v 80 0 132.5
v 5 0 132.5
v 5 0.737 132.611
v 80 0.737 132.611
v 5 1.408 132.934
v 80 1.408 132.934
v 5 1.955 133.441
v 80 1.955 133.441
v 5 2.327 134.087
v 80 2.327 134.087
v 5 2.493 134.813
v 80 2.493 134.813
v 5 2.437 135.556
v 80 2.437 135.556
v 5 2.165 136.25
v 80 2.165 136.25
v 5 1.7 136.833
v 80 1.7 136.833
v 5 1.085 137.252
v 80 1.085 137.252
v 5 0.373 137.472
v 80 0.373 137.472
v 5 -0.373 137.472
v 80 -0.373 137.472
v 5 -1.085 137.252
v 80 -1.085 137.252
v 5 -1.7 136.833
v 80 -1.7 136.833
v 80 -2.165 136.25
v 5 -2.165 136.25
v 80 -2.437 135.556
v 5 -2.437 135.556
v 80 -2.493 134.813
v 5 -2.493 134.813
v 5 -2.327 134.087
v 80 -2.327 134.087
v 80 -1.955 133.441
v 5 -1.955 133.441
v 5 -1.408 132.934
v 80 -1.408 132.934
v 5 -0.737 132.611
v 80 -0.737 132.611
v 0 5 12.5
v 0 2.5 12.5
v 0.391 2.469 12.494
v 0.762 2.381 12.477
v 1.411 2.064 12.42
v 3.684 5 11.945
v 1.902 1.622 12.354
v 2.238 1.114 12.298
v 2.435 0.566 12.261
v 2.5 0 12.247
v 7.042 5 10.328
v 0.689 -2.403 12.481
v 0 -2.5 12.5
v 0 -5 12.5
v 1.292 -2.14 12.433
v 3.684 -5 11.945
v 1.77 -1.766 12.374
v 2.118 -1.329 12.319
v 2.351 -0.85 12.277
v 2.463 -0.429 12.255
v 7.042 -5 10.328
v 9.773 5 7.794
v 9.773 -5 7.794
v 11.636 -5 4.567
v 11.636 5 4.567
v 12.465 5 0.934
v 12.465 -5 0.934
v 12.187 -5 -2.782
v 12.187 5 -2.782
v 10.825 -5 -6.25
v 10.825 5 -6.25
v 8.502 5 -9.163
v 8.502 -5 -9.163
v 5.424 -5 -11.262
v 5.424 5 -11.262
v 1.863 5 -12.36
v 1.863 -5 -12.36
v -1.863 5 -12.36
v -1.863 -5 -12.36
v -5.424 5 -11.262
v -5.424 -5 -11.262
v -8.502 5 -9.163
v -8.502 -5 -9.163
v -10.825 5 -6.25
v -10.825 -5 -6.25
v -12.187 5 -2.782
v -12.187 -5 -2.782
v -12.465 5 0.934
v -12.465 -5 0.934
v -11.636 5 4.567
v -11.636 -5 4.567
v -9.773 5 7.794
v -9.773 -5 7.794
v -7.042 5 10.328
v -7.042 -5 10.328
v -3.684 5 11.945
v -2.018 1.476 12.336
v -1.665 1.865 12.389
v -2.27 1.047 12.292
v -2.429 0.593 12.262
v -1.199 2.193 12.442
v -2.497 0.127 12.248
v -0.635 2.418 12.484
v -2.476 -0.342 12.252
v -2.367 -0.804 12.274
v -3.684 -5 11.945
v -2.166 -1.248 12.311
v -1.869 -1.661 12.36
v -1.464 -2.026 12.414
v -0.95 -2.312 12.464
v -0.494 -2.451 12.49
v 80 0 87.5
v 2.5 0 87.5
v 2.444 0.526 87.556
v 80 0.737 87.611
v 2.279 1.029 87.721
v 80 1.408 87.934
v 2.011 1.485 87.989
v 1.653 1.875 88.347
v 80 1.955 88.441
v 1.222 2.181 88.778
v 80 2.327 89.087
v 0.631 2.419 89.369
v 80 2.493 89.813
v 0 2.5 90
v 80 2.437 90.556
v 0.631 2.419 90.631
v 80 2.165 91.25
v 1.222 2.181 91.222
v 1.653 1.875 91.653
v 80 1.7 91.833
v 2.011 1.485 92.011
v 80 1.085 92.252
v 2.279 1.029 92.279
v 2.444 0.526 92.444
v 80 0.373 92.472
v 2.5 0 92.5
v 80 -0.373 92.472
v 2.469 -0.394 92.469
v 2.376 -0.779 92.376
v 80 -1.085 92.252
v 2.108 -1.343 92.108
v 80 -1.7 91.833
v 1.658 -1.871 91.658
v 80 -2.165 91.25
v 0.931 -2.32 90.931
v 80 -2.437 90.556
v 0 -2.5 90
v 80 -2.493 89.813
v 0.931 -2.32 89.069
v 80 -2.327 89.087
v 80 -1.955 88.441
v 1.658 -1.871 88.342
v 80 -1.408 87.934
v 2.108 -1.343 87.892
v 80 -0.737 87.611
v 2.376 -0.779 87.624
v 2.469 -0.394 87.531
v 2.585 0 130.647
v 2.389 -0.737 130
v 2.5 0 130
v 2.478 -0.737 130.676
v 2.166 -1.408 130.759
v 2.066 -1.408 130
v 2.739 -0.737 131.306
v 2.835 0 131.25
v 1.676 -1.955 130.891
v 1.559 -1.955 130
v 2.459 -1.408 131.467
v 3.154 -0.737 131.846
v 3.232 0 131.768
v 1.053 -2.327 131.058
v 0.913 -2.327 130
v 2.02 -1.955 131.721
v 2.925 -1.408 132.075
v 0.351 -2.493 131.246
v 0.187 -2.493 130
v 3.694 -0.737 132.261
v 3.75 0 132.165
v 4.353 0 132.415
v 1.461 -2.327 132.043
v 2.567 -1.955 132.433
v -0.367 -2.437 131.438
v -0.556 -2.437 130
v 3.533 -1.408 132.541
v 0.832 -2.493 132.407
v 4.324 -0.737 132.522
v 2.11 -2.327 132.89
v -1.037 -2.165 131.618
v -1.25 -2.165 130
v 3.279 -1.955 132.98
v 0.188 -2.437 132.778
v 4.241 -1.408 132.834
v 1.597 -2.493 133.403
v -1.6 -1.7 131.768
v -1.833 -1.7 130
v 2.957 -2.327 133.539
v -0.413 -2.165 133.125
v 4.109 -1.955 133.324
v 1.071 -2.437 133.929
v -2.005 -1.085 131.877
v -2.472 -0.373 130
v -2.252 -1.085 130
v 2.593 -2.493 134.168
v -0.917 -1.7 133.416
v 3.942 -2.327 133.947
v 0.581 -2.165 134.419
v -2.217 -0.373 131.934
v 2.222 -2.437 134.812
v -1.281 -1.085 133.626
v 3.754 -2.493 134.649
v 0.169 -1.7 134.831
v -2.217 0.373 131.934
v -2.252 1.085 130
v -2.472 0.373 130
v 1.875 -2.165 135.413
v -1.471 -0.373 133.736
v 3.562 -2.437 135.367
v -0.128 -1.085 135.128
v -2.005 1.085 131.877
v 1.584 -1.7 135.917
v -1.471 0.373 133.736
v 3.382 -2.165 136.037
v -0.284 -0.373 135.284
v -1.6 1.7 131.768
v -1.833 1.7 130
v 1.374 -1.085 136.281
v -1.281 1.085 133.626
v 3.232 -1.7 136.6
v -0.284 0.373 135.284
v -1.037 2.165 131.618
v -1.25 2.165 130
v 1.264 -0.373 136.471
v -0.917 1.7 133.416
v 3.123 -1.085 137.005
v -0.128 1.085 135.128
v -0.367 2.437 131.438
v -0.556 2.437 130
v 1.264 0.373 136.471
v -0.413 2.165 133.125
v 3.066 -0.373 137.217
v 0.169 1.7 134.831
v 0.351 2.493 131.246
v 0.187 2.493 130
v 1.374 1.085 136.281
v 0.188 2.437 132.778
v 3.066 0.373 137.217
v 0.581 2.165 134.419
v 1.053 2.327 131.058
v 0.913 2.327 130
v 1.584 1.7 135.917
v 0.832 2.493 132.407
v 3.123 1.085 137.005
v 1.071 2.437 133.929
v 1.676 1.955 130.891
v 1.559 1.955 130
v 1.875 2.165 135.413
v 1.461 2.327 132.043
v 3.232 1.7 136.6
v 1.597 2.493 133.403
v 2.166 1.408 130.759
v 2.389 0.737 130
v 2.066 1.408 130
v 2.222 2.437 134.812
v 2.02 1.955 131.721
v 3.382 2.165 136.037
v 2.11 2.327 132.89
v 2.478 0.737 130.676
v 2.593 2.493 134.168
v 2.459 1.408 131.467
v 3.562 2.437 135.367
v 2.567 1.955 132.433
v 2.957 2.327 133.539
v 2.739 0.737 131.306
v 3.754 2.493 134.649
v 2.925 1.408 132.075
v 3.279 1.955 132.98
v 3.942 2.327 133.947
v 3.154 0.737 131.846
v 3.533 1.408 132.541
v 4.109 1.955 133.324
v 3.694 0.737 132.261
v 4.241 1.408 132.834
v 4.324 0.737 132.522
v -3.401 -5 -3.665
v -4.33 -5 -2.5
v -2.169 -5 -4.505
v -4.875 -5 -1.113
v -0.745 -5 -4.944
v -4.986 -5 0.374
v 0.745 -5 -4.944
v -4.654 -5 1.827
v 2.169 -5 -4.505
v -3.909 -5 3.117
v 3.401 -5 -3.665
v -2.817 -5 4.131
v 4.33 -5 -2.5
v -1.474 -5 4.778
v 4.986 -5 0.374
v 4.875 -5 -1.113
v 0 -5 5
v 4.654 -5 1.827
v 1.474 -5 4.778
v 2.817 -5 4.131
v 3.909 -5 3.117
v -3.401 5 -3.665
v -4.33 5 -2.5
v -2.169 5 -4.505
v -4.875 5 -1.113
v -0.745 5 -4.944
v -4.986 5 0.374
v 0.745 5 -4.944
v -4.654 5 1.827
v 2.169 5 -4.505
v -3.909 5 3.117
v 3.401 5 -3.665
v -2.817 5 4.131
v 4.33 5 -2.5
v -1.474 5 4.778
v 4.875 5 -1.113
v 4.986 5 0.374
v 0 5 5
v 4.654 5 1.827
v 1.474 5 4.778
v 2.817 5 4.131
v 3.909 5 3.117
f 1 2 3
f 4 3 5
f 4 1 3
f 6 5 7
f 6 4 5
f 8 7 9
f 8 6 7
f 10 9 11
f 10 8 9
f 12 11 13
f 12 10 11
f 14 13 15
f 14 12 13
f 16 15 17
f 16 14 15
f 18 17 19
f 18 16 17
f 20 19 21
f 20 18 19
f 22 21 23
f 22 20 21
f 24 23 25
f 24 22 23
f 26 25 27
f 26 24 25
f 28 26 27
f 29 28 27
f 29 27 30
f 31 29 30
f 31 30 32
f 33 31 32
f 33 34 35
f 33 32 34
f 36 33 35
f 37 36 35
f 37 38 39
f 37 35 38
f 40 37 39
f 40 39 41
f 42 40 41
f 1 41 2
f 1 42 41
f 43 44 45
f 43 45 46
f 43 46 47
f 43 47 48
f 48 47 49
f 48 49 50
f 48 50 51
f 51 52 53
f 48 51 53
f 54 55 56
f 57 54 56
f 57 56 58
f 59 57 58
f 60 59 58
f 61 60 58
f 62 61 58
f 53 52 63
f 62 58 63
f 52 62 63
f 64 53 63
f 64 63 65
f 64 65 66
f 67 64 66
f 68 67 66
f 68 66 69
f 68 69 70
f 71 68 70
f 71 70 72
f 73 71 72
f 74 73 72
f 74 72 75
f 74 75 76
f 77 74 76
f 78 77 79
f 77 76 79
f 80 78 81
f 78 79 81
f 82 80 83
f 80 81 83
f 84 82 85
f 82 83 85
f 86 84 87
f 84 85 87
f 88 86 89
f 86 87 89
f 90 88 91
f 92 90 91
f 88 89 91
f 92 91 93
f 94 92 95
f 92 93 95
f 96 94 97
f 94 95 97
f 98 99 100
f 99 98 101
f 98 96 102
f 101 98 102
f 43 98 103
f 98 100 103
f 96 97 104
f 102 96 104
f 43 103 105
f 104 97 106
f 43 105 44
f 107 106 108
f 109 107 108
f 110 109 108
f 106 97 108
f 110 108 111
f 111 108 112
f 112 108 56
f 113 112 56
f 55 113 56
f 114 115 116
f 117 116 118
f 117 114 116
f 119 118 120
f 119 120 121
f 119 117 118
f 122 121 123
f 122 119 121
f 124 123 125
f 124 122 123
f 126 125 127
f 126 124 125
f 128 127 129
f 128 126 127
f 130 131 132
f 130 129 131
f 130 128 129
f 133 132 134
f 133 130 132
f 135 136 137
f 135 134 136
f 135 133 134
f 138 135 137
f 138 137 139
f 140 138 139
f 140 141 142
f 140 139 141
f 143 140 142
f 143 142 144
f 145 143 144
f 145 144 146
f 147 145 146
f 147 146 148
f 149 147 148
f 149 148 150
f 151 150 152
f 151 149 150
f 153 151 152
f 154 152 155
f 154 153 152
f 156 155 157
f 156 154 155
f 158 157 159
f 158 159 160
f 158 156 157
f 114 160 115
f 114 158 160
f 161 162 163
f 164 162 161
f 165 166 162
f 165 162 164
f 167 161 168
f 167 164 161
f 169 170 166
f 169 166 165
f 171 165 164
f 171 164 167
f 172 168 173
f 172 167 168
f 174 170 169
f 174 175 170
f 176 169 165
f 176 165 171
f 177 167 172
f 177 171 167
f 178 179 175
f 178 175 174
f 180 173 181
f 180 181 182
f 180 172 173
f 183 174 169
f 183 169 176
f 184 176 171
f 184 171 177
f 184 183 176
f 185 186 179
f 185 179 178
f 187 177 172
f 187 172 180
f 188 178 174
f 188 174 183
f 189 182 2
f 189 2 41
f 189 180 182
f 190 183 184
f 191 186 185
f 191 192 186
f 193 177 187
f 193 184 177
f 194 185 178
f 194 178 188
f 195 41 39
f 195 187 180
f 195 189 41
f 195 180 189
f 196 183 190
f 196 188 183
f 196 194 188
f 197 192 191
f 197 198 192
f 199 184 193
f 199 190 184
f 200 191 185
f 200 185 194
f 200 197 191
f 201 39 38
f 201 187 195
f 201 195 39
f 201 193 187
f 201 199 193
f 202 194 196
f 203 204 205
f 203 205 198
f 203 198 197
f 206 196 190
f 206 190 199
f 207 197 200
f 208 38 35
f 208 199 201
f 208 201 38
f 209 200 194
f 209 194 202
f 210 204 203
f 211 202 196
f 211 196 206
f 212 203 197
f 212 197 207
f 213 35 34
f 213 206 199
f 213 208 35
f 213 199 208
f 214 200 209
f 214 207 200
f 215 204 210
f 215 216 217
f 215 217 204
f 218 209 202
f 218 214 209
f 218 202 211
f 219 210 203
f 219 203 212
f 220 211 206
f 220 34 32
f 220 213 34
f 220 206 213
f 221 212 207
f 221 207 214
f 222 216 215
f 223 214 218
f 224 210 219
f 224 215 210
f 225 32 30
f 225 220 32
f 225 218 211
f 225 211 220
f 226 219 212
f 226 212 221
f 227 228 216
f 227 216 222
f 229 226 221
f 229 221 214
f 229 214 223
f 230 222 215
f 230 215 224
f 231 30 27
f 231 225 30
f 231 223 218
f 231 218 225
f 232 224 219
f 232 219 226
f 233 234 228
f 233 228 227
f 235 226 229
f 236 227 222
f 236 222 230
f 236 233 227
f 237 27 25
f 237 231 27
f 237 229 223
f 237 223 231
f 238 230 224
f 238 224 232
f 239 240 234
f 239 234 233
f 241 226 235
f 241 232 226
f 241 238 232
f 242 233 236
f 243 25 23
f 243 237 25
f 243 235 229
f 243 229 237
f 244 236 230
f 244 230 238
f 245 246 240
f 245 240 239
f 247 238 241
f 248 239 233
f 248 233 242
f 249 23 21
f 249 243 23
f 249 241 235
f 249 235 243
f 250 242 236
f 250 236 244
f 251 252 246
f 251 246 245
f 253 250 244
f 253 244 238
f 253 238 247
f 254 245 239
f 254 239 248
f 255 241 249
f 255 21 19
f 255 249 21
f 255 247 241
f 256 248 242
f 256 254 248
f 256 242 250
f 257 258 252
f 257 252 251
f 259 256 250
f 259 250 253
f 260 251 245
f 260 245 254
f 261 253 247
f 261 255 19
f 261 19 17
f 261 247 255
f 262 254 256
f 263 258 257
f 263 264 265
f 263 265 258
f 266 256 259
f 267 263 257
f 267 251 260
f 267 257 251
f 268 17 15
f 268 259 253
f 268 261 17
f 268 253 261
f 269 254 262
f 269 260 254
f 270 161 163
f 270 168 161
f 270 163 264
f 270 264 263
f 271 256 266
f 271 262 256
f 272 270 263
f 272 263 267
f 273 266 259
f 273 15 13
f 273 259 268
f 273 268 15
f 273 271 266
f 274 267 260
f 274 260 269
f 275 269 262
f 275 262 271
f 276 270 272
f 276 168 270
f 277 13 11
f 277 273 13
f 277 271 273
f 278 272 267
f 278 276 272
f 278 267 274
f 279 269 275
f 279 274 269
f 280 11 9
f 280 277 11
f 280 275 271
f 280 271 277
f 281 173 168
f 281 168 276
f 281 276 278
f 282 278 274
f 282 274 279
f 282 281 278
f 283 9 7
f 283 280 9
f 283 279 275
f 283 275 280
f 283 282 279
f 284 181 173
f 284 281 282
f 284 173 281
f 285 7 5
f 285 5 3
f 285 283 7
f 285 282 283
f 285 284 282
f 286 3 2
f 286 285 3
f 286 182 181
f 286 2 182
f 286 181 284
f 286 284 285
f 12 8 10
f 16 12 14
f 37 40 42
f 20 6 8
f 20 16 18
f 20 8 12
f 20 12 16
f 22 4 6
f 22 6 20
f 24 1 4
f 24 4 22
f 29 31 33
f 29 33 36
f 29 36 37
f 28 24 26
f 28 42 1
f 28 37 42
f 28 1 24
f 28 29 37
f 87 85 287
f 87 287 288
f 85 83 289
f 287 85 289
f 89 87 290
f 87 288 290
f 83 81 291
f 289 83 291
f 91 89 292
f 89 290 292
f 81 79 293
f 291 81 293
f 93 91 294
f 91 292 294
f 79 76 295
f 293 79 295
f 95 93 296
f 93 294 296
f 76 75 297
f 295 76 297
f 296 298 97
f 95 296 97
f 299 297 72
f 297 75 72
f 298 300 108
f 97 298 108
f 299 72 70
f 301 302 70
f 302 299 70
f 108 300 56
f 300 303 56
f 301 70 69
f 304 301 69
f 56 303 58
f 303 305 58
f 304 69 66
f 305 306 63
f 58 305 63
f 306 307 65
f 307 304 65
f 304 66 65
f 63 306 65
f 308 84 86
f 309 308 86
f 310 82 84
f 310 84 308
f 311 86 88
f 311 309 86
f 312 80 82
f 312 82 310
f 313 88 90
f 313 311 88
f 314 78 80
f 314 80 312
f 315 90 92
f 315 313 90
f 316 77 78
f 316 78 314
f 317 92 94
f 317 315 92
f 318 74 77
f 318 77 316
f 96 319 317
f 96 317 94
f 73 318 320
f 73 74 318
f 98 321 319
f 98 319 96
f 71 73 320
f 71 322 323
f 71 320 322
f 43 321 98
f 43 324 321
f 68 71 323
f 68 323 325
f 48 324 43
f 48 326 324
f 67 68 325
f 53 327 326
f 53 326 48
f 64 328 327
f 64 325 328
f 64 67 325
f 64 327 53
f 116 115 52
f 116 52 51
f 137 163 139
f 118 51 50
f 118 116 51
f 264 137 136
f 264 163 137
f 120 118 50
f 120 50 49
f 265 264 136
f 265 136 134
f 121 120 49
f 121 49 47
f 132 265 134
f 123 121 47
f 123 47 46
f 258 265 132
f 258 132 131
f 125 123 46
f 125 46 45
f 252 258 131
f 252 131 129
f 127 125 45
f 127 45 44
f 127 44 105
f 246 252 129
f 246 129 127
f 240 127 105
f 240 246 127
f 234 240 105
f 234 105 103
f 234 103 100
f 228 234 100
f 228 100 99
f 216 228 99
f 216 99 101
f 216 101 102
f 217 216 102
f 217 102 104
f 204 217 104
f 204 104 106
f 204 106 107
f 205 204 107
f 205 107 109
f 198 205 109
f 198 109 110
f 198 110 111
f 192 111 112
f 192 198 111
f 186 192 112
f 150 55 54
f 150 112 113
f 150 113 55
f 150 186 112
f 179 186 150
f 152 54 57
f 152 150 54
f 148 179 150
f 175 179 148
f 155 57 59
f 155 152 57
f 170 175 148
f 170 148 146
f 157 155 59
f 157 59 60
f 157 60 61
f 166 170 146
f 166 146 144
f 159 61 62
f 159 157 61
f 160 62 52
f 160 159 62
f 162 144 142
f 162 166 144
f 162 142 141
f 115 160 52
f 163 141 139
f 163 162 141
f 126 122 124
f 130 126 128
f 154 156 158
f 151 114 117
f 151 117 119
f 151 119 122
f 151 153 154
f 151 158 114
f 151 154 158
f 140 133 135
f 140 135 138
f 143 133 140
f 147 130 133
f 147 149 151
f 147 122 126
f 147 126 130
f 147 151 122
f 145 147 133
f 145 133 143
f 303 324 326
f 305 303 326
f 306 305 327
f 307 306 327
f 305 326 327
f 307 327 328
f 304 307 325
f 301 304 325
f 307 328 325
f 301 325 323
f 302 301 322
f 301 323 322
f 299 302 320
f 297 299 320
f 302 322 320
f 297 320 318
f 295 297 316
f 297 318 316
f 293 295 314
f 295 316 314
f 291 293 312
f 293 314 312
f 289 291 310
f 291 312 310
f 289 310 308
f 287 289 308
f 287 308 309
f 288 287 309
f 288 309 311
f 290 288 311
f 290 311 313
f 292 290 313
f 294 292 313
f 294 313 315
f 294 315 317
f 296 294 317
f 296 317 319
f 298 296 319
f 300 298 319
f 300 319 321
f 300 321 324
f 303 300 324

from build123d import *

# Parameters (mm, degrees)
SKETCH2_R                = 2.5
SKETCH3_R                = 2.5
BOSS_EXTRUDE1_DEPTH      = 5
BOSS_EXTRUDE1_DEPTH_BACK = 5
SKETCH4_R                = 12.5
SKETCH5_R                = 5
CUT_EXTRUDE1_DEPTH       = 160.393381385


with BuildPart() as part:
    # Sweep1: sweep along a path in Sketch1
    with BuildLine(Plane(origin=(0, 0, 0), x_dir=(1, 0, 0), z_dir=(0, 1, 0))) as sweep1_path:
        Line((0, 0), (0, -90))
        Line((0, -90), (0, -130))
        ThreePointArc((0, -130), (1.464466094, -133.535533906), (5, -135))
        Line((5, -135), (80, -135))
    # Sketch2 → Sweep1 (sweep)
    with BuildSketch(Plane(origin=(80, 0, 135), x_dir=(0, 0, -1), z_dir=(1, 0, 0))):
        Circle(SKETCH2_R)
    sweep(path=sweep1_path.line)

    # Sweep2: sweep along a path in Sketch1<4>
    with BuildLine(Plane(origin=(0, 0, 0), x_dir=(1, 0, 0), z_dir=(0, 1, 0))) as sweep2_path:
        Line((0, -90), (80, -90))
    # Sketch3 → Sweep2 (sweep)
    with BuildSketch(Plane(origin=(80, 0, 135), x_dir=(0, 0, -1), z_dir=(1, 0, 0))):
        with Locations((45, 0)):
            Circle(SKETCH3_R)
    sweep(path=sweep2_path.line)

    # Sketch4 → Boss-Extrude1 (add, two sides: drawn at the far end of the back side and taken through both)
    with BuildSketch(Plane(origin=(0, 0, 0), x_dir=(1, 0, 0), z_dir=(0, 1, 0)).offset(-BOSS_EXTRUDE1_DEPTH_BACK)):
        Circle(SKETCH4_R)
    extrude(amount=BOSS_EXTRUDE1_DEPTH + BOSS_EXTRUDE1_DEPTH_BACK)

    # Sketch5 → Cut-Extrude1 (cut, through all)
    with BuildSketch(Plane(origin=(0, 5, 0), x_dir=(1, 0, 0), z_dir=(0, 1, 0))):
        Circle(SKETCH5_R)
    extrude(amount=-CUT_EXTRUDE1_DEPTH, mode=Mode.SUBTRACT)


solid = part.part
